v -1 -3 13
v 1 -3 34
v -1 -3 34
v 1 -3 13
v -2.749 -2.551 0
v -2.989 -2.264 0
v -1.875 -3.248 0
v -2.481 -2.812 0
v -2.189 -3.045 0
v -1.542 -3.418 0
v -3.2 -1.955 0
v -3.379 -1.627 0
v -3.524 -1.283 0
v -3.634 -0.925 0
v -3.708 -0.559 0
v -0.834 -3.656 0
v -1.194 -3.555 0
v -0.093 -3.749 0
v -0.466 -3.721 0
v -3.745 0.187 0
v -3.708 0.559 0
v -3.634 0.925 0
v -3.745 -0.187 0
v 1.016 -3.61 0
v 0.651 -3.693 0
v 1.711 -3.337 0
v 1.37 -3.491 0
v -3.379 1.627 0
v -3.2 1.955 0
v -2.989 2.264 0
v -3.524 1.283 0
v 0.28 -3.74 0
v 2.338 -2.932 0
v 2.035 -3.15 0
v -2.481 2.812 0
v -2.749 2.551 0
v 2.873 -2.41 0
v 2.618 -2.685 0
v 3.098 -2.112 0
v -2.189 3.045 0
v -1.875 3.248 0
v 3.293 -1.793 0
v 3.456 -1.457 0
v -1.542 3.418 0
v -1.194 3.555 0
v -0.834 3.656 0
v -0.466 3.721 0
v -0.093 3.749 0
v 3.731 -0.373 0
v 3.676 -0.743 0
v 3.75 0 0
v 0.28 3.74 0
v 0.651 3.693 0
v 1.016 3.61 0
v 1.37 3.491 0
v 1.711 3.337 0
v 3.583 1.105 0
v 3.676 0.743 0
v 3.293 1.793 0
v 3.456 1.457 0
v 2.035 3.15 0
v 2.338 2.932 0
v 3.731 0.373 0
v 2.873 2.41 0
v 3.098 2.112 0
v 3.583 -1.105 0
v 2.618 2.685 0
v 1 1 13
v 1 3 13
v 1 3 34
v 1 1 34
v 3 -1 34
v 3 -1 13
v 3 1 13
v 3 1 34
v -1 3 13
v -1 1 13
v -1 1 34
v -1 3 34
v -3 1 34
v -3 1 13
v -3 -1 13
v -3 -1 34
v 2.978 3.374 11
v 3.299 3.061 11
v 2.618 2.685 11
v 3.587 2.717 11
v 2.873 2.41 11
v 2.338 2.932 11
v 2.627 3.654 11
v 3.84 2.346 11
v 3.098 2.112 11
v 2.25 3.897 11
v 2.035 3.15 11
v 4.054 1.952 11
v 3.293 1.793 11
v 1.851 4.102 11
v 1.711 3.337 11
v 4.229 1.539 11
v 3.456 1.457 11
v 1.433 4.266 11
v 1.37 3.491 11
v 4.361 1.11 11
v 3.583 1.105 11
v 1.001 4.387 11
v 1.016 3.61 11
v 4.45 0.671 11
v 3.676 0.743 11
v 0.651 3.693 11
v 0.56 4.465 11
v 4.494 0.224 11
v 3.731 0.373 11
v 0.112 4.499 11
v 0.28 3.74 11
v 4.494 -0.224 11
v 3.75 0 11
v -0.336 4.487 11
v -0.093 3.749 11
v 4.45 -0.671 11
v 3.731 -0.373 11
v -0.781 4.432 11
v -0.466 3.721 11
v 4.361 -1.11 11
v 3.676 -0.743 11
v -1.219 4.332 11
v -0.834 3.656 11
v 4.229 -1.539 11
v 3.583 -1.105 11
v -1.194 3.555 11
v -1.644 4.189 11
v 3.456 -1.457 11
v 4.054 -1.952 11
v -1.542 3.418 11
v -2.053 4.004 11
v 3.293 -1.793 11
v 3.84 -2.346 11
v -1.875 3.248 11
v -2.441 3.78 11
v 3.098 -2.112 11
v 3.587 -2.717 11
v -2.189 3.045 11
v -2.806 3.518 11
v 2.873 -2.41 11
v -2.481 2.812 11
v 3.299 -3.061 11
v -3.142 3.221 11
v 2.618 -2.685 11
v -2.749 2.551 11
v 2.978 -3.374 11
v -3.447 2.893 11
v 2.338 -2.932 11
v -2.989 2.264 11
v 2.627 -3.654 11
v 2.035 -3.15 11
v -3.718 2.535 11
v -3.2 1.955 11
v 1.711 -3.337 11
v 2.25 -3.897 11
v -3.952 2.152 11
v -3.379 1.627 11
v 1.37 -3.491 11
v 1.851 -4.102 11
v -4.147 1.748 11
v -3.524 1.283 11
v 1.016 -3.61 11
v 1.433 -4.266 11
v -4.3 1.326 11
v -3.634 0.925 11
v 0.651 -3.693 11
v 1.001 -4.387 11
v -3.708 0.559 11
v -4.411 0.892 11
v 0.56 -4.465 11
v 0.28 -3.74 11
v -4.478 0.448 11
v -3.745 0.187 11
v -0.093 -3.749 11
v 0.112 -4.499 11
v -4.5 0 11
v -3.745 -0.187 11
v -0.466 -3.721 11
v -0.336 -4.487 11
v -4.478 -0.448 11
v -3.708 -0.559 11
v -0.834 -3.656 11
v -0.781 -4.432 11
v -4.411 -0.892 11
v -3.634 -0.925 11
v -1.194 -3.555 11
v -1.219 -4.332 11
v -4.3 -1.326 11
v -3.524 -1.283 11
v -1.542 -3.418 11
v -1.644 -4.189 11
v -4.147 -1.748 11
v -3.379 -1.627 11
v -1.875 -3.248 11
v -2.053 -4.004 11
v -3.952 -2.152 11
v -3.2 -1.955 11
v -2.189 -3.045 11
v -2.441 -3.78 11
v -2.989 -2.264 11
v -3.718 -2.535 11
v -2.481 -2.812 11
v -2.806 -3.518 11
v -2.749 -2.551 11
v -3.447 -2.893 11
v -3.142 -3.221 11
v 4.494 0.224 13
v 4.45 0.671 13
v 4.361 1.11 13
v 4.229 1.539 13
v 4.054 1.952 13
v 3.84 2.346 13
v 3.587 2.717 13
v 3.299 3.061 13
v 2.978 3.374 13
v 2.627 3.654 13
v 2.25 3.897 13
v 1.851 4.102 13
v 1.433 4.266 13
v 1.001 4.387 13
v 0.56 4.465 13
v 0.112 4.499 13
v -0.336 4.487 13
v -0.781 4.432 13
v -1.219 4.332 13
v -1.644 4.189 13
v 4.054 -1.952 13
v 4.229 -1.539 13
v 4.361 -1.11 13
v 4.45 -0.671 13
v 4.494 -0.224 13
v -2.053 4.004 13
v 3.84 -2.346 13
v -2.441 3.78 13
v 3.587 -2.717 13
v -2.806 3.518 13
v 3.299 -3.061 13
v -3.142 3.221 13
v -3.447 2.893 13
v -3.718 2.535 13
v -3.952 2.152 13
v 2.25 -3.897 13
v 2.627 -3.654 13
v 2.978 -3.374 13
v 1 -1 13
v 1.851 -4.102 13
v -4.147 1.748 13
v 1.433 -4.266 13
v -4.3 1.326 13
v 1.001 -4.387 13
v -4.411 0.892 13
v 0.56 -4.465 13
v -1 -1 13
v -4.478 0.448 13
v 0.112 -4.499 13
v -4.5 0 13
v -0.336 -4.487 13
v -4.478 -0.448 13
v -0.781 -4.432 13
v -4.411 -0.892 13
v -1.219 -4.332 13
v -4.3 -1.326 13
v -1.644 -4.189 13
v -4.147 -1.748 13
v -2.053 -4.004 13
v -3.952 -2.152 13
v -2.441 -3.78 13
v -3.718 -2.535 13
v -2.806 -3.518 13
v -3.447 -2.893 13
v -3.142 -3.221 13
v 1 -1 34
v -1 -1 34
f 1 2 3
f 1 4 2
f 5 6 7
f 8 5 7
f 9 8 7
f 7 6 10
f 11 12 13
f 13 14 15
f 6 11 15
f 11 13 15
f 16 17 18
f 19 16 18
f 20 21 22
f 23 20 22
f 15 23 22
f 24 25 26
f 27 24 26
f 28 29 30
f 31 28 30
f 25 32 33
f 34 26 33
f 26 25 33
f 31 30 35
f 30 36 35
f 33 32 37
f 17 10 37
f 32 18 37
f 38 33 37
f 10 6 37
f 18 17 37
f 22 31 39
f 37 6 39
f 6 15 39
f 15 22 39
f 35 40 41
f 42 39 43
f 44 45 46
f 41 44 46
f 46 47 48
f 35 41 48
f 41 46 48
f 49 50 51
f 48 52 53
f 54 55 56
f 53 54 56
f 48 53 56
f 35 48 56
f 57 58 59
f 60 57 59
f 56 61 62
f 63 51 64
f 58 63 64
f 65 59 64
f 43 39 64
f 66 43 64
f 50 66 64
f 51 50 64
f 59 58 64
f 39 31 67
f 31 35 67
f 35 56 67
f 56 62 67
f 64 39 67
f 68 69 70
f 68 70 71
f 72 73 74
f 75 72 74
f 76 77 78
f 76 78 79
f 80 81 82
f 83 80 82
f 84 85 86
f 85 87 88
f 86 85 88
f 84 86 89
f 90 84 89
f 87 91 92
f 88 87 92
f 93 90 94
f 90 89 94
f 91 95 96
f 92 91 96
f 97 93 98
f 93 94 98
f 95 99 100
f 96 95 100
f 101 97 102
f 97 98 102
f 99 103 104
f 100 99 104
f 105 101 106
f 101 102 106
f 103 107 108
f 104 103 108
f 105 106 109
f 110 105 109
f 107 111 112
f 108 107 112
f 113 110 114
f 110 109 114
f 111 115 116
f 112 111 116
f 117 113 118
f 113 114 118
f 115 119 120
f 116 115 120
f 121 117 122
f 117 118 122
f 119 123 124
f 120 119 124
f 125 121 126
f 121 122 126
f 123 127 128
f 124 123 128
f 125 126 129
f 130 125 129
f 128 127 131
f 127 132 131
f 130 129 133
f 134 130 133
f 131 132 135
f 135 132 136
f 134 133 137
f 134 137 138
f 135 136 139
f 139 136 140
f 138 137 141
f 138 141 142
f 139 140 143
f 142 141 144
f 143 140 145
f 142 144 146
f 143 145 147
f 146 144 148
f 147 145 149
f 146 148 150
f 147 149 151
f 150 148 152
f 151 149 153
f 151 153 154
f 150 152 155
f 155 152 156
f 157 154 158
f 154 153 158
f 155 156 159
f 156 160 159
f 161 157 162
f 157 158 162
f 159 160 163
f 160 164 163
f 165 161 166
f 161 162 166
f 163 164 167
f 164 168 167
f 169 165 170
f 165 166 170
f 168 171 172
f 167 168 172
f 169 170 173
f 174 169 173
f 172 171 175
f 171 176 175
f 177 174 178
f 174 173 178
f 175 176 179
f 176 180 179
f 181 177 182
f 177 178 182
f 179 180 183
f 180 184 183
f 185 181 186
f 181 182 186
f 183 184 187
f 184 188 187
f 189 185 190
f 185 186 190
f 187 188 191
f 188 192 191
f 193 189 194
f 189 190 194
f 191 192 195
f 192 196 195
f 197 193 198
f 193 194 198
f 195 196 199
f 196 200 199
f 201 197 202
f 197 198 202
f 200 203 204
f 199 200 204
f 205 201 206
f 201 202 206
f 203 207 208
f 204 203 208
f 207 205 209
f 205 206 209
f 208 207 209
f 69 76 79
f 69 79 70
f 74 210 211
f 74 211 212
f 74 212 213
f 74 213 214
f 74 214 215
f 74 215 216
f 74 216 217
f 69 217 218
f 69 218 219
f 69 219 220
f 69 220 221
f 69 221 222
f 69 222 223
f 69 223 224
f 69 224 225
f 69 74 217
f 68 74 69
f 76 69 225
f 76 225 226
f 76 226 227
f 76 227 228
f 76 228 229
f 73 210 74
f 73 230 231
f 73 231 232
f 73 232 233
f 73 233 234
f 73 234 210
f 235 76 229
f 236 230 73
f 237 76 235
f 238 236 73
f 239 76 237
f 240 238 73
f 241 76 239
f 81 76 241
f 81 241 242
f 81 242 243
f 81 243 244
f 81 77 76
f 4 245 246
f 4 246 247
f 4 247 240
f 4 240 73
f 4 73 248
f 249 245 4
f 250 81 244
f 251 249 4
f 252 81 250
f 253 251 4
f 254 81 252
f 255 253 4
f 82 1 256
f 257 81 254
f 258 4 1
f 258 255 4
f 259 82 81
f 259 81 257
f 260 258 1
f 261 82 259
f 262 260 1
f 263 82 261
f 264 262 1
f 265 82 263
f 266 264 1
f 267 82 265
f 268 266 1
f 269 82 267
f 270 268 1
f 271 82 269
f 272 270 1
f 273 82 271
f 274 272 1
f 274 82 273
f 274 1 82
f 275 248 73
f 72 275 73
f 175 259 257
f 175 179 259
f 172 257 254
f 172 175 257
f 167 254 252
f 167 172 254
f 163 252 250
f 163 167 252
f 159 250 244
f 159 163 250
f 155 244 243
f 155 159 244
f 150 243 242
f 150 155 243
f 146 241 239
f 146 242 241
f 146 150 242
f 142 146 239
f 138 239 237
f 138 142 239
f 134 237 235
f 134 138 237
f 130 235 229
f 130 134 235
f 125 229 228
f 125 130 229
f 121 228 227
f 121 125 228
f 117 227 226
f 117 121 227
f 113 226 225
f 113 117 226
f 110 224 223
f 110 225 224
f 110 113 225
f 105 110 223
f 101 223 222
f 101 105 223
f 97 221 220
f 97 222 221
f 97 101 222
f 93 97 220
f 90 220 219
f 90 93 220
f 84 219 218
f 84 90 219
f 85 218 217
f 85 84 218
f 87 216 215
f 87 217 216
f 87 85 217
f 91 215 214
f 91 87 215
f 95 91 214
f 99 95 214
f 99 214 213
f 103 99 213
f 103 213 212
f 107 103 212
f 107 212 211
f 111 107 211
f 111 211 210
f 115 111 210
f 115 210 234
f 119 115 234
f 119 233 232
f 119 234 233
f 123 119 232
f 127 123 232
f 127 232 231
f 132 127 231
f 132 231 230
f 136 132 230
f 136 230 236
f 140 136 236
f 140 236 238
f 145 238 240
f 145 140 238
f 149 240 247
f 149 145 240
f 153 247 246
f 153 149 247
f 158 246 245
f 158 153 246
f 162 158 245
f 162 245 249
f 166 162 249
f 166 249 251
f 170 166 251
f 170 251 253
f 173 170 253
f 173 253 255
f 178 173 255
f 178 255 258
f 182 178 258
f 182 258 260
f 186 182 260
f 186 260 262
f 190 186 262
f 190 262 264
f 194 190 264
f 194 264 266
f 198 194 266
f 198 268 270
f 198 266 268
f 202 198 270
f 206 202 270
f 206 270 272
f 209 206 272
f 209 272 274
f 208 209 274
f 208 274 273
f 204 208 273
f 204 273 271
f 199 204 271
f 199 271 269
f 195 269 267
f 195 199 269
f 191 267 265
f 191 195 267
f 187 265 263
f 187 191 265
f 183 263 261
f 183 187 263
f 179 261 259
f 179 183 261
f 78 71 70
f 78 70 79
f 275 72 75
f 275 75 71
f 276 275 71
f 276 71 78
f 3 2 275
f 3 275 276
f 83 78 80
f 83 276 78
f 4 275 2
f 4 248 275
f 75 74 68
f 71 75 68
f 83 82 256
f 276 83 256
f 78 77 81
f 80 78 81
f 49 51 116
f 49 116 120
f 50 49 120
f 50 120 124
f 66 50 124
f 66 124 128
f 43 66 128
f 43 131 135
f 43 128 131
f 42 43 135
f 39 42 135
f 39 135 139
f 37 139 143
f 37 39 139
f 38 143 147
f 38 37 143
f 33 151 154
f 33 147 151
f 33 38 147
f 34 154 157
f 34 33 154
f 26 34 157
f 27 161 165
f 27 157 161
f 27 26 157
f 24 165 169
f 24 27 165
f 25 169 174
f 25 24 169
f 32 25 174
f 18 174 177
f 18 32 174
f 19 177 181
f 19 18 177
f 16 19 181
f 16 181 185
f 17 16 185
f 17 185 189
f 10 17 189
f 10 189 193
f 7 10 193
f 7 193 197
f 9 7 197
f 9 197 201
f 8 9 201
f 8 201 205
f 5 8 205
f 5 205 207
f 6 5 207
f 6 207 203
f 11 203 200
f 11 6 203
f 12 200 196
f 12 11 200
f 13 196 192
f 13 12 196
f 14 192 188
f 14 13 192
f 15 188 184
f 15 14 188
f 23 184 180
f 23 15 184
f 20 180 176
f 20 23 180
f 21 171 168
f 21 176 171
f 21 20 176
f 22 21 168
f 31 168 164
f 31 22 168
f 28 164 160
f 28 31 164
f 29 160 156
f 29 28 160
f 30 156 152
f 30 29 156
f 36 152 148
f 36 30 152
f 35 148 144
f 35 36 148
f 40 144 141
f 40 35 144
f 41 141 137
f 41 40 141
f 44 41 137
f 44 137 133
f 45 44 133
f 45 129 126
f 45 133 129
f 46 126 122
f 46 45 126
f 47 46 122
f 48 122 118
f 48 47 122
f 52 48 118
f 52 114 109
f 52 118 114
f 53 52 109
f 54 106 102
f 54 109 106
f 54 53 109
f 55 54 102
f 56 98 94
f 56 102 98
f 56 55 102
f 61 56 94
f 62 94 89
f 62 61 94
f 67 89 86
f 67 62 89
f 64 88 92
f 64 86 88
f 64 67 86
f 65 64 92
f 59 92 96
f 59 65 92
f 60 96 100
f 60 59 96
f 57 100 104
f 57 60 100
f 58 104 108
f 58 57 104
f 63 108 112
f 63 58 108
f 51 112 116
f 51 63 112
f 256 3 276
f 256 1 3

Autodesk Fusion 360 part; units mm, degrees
sketch "Sketch1" plane through (0, 0, 0) normal (0, 0, 1) x (1, 0, 0)
  circle A0 centre (0, 0) radius 3.75
  dimension "d1" = 7.5
extrude "Extrude1" add sketch "Sketch1" along normal blind 11
sketch "Sketch2" plane through (0, 0, 11) normal (0, 0, 1) x (-1, 0, 0)
  circle A0 centre (0, 0) radius 3.75
  circle A1 centre (0, 0) radius 4.5
  dimension "d4" = 9
extrude "Extrude2" add sketch "Sketch2" along normal blind 2 contours A0 | A1
sketch "Sketch3" plane through (0, 0, 13) normal (0, 0, 1) x (-1, 0, 0)
  circle A0 centre (0, 0) radius 4.5
  line L0 (-1, 3) -> (1, 3)
  line L1 (1, -3) -> (-1, -3)
  line L2 (-3, 1) -> (-3, -1)
  line L3 (3, -1) -> (3, 1)
  line L4 (3, 1) -> (1, 1)
  line L5 (-1, 1) -> (-3, 1)
  line L6 (-1, -3) -> (-1, -1)
  line L7 (-1, 1) -> (-1, 3)
  line L8 (1, 3) -> (1, 1)
  line L9 (1, -1) -> (1, -3)
  line L10 (-3, -1) -> (-1, -1)
  line L11 (1, -1) -> (3, -1)
  dimension "d7" = 6
  dimension "d8" = 6
  dimension "d9" = 2
extrude "Extrude3" add sketch "Sketch3" along normal blind 21 contours L0 L1 L2 L3 L4 L5 L6 L7 L8 L9 L10 L11
